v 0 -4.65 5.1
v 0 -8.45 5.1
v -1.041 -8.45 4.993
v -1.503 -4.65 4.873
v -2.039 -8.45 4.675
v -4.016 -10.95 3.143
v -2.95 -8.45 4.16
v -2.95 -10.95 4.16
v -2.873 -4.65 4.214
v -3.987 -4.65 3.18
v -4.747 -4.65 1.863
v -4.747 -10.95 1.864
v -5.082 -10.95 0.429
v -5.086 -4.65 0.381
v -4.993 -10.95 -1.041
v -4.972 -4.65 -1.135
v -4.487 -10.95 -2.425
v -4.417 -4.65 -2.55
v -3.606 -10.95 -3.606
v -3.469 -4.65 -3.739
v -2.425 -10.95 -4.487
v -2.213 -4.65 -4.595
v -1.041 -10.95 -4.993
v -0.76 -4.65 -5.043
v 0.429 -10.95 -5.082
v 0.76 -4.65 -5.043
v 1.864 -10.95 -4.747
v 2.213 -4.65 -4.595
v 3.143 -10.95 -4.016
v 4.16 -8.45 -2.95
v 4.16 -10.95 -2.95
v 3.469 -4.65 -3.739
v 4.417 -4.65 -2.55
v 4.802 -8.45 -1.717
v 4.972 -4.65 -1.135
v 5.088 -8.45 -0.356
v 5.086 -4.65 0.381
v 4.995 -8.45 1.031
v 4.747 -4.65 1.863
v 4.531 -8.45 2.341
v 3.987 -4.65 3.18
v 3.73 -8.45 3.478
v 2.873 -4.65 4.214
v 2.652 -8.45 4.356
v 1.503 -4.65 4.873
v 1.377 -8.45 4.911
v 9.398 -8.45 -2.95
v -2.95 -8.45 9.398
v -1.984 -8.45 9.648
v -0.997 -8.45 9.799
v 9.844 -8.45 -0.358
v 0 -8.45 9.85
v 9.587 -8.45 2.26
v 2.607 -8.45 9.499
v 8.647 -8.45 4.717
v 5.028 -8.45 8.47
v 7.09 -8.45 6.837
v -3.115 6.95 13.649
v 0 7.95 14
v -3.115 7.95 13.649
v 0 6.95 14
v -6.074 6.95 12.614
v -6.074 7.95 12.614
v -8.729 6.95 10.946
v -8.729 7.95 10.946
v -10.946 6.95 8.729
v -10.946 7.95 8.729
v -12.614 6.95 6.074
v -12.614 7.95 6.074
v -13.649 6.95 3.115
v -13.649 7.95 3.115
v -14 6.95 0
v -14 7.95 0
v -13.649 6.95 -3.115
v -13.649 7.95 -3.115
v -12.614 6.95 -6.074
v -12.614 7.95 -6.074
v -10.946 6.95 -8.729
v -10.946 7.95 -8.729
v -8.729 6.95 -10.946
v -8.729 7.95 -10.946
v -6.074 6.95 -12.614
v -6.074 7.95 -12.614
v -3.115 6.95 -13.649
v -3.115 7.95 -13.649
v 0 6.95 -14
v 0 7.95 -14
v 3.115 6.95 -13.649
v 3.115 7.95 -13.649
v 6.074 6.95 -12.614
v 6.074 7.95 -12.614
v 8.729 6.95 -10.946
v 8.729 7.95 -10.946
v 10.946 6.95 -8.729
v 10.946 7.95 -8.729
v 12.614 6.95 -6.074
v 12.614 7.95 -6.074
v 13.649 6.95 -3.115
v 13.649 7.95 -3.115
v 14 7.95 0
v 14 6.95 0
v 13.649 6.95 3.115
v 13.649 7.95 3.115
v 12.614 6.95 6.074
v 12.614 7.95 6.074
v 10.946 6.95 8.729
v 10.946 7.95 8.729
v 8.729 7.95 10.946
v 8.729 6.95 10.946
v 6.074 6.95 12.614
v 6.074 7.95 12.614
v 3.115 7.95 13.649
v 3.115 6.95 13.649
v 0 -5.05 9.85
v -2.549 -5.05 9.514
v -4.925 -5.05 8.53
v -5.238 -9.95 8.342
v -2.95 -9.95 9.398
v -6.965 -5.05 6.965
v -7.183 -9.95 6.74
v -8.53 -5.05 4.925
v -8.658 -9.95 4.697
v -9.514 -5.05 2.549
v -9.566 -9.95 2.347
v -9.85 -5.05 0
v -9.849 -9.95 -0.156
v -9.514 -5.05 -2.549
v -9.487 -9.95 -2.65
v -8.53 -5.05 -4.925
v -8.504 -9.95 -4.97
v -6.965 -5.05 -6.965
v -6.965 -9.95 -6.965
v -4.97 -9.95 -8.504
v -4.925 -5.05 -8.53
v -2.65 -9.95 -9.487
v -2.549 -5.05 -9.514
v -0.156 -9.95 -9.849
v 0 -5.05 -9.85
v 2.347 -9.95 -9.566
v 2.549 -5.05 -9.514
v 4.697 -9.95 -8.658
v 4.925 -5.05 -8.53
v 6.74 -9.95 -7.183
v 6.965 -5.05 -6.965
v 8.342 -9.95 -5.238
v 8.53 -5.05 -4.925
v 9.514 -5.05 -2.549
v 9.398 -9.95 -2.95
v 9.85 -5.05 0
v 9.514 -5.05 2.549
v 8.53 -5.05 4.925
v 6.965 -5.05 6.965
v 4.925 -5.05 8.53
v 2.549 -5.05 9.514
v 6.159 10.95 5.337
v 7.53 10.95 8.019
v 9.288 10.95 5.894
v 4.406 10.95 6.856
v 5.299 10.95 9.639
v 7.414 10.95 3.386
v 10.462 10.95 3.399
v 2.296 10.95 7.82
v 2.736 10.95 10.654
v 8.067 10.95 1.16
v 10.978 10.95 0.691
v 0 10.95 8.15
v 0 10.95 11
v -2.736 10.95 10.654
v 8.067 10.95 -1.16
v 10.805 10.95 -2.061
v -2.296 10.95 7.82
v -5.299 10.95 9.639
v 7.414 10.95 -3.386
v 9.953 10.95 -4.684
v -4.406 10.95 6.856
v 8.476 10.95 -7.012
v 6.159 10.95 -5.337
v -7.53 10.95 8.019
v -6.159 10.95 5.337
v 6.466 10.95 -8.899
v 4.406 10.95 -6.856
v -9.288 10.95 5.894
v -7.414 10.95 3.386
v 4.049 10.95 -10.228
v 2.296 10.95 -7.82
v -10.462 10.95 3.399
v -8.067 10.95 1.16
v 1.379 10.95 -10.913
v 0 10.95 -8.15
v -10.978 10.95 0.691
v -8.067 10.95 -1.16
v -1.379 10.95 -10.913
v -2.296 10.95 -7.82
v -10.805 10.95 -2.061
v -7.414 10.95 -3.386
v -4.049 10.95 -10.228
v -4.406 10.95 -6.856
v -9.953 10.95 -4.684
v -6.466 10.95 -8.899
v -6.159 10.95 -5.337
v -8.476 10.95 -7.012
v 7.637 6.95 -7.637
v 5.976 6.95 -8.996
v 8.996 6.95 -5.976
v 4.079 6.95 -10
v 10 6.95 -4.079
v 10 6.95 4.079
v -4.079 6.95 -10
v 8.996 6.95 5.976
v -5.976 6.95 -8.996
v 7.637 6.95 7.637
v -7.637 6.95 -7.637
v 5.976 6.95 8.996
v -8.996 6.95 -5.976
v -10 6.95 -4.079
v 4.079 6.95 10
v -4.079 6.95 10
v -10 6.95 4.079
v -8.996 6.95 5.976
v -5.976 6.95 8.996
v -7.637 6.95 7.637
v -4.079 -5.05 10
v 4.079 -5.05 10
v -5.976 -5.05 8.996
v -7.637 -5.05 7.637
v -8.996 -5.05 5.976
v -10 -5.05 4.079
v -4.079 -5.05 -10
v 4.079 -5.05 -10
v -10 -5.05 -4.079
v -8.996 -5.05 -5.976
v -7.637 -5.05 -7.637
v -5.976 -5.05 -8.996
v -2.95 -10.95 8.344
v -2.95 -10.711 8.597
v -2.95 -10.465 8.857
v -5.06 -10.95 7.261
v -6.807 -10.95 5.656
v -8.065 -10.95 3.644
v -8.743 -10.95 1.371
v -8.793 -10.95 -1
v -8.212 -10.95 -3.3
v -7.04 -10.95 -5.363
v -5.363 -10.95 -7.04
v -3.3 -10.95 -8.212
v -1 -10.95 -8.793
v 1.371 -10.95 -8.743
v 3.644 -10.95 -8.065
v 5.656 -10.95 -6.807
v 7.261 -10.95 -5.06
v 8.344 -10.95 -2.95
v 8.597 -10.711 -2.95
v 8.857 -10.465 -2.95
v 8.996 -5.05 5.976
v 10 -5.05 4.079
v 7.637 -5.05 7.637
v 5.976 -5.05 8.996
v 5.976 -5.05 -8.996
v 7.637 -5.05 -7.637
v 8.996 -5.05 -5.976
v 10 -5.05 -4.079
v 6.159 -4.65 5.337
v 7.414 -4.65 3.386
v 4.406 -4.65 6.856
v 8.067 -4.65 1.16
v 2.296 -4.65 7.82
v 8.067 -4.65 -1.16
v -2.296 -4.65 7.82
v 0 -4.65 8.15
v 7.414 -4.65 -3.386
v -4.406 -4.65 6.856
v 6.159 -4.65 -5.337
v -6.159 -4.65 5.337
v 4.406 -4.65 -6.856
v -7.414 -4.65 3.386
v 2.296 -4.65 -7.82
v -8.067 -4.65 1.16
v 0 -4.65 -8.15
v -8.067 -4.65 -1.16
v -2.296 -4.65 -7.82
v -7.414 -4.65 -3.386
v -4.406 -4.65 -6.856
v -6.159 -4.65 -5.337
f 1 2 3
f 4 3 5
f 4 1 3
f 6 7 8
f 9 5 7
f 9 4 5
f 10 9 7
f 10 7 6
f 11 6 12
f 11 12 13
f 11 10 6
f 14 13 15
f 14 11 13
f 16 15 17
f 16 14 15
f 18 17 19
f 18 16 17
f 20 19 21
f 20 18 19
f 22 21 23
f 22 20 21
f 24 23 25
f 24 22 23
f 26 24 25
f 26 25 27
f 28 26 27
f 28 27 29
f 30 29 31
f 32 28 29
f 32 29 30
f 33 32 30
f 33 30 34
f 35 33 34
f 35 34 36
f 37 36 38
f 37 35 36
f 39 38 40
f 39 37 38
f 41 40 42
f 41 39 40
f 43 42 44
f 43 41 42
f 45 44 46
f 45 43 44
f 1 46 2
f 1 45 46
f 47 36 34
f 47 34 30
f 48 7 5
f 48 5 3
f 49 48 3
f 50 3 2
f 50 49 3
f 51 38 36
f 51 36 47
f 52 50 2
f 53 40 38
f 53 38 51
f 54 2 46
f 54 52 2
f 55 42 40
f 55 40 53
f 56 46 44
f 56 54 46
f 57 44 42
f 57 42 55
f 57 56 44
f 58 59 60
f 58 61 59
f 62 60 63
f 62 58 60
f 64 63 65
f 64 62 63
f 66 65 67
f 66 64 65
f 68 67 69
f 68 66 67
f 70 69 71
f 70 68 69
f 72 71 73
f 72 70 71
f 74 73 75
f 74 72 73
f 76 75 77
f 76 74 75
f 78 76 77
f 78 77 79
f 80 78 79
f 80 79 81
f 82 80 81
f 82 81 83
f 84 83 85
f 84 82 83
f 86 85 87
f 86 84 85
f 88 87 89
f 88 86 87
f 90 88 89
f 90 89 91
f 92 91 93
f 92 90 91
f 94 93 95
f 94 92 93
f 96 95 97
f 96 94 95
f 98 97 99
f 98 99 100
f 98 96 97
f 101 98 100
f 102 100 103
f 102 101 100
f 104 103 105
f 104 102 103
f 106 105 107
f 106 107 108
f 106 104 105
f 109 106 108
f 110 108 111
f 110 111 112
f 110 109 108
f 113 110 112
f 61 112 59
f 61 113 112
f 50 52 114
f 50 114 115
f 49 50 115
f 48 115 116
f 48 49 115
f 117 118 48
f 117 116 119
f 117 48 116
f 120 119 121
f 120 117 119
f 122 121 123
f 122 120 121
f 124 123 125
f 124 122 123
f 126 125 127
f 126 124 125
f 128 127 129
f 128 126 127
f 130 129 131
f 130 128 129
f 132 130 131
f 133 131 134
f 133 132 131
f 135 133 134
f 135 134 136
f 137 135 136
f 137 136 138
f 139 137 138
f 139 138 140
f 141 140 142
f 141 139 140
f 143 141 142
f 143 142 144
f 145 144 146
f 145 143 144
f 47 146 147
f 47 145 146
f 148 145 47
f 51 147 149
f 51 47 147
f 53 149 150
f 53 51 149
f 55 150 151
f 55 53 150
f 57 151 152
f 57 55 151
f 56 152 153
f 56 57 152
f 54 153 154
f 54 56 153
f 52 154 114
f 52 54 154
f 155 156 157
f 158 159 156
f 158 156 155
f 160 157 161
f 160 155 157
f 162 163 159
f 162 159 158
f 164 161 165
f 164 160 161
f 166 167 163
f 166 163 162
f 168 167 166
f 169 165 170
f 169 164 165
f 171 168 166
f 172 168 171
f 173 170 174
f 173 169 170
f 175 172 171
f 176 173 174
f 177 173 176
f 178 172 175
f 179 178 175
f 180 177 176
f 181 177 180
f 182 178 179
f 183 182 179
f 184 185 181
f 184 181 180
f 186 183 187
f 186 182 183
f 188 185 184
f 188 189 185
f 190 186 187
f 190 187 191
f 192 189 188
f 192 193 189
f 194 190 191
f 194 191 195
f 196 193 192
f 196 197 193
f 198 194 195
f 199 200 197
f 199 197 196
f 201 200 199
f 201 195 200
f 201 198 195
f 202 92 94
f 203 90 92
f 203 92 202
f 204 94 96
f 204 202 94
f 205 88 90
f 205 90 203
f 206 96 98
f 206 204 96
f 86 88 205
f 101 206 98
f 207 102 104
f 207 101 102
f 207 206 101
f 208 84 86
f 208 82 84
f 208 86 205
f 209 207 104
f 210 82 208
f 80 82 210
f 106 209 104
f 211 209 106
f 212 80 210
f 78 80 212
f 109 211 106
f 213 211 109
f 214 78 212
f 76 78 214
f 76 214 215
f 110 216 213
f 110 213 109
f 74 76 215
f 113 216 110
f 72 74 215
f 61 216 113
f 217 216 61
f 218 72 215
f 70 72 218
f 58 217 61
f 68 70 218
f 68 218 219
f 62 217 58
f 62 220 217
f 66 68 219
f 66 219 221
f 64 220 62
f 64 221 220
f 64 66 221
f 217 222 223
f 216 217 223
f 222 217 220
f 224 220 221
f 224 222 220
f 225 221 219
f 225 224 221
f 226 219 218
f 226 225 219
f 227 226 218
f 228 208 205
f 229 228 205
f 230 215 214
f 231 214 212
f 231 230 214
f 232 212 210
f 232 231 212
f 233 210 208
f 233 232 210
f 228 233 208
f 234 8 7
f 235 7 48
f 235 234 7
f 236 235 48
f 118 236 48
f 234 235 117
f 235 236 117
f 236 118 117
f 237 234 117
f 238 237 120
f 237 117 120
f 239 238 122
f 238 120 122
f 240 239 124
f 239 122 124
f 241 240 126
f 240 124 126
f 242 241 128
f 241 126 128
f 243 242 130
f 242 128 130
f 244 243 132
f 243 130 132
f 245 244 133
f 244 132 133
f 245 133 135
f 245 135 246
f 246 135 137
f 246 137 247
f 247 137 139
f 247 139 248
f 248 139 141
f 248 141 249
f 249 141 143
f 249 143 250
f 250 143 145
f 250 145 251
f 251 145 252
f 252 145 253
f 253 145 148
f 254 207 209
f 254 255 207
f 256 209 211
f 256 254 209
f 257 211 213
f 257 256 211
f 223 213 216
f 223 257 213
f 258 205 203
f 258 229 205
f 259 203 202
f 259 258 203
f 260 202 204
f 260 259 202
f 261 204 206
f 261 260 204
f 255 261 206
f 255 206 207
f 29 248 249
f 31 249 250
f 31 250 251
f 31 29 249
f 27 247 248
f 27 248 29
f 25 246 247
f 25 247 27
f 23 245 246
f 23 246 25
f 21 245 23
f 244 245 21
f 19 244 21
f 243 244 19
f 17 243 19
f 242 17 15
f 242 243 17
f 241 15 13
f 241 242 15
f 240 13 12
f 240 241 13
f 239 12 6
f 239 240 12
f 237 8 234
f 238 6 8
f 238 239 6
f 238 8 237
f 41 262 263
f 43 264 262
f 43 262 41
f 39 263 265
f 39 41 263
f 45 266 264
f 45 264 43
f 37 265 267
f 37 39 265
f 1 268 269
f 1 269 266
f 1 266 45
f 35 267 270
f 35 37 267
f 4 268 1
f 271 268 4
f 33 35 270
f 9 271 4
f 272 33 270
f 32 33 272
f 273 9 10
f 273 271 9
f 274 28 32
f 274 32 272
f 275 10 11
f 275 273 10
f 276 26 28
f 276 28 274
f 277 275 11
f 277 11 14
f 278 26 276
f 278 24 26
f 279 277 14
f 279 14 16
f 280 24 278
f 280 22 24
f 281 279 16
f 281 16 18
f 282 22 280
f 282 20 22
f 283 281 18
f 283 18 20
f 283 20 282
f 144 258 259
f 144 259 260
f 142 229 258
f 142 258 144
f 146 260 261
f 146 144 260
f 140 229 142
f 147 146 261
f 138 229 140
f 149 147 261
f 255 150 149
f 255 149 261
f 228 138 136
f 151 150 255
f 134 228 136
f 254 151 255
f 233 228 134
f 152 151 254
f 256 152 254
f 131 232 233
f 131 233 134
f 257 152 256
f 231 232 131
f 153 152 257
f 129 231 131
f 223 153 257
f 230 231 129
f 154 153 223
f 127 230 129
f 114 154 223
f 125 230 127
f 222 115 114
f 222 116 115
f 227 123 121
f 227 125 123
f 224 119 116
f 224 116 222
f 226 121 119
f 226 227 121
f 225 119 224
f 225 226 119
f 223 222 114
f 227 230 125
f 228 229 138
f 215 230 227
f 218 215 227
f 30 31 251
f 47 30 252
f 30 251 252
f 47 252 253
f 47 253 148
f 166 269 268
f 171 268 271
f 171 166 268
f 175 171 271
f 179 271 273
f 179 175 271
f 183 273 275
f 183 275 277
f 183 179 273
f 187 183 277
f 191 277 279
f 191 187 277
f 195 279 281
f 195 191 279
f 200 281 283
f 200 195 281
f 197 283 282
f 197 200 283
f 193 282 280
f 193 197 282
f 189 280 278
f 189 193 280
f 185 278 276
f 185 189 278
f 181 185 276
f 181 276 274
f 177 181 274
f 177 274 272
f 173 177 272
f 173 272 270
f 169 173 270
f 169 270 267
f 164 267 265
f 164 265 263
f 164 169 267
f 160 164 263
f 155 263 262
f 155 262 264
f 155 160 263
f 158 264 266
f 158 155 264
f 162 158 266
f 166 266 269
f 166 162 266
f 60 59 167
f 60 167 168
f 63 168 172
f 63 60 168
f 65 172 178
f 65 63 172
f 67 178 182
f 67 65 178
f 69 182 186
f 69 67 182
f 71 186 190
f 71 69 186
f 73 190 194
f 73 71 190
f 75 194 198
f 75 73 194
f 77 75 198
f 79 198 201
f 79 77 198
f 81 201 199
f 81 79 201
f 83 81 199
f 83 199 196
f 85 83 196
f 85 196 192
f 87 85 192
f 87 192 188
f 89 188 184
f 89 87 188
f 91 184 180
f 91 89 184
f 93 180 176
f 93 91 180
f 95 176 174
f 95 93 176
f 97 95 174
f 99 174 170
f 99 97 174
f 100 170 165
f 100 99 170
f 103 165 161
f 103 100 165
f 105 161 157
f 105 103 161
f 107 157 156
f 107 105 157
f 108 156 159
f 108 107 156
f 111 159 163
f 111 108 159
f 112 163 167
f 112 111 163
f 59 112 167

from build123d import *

# Parameters (mm, degrees)
SMUSSO1_SIZE             = 3
SCHIZZO2_R               = 18.679375542
SCHIZZO2_W               = 20
SCHIZZO2_H               = 20
TAGLIO_ESTRUSIONE1_DEPTH = 17.9
SCHIZZO3_W               = 20
SCHIZZO3_H               = 20
TAGLIO_ESTRUSIONE2_DEPTH = 2.5
SMUSSO2_SIZE             = 1


with BuildPart() as part:
    # Schizzo1 → Rivoluzione1 (revolve)
    with BuildSketch(Plane.XY, mode=Mode.PRIVATE) as rivoluzione1_sk:
        Polygon((8.15, -4.65), (8.15, 10.95), (14, 10.95), (14, 6.95), (10.8, 6.95), (10.8, -5.05), (9.85, -5.05), (9.85, -10.95), (5.1, -10.95), (5.1, -4.65), align=None)
    revolve(rivoluzione1_sk.sketch.rotate(Axis((0, 15.297202797, 0), (0, -1, 0)), 90), axis=Axis((0, 15.297202797, 0), (0, -1, 0)))

    # Smusso1
    smusso1_edges = [part.edges().sort_by_distance(p)[0] for p in [
        (0, 10.95, -14),
    ]]
    chamfer(smusso1_edges, length=SMUSSO1_SIZE)

    # Schizzo2 → Taglio-Estrusione1 (cut)
    with BuildSketch(Plane.XZ.offset(10.95)):
        Circle(SCHIZZO2_R)
        Rectangle(SCHIZZO2_W, SCHIZZO2_H, mode=Mode.SUBTRACT)
    extrude(amount=-TAGLIO_ESTRUSIONE1_DEPTH, mode=Mode.SUBTRACT)

    # Schizzo3 → Taglio-Estrusione2 (cut)
    with BuildSketch(Plane.XZ.offset(10.95)):
        with Locations((7.05, 7.05)):
            Rectangle(SCHIZZO3_W, SCHIZZO3_H)
    extrude(amount=-TAGLIO_ESTRUSIONE2_DEPTH, mode=Mode.SUBTRACT)

    # Smusso2
    smusso2_edges = [part.edges().sort_by_distance(p)[0] for p in [
        (-6.965001795, -10.95, -6.965001795),
    ]]
    chamfer(smusso2_edges, length=SMUSSO2_SIZE)


solid = part.part
